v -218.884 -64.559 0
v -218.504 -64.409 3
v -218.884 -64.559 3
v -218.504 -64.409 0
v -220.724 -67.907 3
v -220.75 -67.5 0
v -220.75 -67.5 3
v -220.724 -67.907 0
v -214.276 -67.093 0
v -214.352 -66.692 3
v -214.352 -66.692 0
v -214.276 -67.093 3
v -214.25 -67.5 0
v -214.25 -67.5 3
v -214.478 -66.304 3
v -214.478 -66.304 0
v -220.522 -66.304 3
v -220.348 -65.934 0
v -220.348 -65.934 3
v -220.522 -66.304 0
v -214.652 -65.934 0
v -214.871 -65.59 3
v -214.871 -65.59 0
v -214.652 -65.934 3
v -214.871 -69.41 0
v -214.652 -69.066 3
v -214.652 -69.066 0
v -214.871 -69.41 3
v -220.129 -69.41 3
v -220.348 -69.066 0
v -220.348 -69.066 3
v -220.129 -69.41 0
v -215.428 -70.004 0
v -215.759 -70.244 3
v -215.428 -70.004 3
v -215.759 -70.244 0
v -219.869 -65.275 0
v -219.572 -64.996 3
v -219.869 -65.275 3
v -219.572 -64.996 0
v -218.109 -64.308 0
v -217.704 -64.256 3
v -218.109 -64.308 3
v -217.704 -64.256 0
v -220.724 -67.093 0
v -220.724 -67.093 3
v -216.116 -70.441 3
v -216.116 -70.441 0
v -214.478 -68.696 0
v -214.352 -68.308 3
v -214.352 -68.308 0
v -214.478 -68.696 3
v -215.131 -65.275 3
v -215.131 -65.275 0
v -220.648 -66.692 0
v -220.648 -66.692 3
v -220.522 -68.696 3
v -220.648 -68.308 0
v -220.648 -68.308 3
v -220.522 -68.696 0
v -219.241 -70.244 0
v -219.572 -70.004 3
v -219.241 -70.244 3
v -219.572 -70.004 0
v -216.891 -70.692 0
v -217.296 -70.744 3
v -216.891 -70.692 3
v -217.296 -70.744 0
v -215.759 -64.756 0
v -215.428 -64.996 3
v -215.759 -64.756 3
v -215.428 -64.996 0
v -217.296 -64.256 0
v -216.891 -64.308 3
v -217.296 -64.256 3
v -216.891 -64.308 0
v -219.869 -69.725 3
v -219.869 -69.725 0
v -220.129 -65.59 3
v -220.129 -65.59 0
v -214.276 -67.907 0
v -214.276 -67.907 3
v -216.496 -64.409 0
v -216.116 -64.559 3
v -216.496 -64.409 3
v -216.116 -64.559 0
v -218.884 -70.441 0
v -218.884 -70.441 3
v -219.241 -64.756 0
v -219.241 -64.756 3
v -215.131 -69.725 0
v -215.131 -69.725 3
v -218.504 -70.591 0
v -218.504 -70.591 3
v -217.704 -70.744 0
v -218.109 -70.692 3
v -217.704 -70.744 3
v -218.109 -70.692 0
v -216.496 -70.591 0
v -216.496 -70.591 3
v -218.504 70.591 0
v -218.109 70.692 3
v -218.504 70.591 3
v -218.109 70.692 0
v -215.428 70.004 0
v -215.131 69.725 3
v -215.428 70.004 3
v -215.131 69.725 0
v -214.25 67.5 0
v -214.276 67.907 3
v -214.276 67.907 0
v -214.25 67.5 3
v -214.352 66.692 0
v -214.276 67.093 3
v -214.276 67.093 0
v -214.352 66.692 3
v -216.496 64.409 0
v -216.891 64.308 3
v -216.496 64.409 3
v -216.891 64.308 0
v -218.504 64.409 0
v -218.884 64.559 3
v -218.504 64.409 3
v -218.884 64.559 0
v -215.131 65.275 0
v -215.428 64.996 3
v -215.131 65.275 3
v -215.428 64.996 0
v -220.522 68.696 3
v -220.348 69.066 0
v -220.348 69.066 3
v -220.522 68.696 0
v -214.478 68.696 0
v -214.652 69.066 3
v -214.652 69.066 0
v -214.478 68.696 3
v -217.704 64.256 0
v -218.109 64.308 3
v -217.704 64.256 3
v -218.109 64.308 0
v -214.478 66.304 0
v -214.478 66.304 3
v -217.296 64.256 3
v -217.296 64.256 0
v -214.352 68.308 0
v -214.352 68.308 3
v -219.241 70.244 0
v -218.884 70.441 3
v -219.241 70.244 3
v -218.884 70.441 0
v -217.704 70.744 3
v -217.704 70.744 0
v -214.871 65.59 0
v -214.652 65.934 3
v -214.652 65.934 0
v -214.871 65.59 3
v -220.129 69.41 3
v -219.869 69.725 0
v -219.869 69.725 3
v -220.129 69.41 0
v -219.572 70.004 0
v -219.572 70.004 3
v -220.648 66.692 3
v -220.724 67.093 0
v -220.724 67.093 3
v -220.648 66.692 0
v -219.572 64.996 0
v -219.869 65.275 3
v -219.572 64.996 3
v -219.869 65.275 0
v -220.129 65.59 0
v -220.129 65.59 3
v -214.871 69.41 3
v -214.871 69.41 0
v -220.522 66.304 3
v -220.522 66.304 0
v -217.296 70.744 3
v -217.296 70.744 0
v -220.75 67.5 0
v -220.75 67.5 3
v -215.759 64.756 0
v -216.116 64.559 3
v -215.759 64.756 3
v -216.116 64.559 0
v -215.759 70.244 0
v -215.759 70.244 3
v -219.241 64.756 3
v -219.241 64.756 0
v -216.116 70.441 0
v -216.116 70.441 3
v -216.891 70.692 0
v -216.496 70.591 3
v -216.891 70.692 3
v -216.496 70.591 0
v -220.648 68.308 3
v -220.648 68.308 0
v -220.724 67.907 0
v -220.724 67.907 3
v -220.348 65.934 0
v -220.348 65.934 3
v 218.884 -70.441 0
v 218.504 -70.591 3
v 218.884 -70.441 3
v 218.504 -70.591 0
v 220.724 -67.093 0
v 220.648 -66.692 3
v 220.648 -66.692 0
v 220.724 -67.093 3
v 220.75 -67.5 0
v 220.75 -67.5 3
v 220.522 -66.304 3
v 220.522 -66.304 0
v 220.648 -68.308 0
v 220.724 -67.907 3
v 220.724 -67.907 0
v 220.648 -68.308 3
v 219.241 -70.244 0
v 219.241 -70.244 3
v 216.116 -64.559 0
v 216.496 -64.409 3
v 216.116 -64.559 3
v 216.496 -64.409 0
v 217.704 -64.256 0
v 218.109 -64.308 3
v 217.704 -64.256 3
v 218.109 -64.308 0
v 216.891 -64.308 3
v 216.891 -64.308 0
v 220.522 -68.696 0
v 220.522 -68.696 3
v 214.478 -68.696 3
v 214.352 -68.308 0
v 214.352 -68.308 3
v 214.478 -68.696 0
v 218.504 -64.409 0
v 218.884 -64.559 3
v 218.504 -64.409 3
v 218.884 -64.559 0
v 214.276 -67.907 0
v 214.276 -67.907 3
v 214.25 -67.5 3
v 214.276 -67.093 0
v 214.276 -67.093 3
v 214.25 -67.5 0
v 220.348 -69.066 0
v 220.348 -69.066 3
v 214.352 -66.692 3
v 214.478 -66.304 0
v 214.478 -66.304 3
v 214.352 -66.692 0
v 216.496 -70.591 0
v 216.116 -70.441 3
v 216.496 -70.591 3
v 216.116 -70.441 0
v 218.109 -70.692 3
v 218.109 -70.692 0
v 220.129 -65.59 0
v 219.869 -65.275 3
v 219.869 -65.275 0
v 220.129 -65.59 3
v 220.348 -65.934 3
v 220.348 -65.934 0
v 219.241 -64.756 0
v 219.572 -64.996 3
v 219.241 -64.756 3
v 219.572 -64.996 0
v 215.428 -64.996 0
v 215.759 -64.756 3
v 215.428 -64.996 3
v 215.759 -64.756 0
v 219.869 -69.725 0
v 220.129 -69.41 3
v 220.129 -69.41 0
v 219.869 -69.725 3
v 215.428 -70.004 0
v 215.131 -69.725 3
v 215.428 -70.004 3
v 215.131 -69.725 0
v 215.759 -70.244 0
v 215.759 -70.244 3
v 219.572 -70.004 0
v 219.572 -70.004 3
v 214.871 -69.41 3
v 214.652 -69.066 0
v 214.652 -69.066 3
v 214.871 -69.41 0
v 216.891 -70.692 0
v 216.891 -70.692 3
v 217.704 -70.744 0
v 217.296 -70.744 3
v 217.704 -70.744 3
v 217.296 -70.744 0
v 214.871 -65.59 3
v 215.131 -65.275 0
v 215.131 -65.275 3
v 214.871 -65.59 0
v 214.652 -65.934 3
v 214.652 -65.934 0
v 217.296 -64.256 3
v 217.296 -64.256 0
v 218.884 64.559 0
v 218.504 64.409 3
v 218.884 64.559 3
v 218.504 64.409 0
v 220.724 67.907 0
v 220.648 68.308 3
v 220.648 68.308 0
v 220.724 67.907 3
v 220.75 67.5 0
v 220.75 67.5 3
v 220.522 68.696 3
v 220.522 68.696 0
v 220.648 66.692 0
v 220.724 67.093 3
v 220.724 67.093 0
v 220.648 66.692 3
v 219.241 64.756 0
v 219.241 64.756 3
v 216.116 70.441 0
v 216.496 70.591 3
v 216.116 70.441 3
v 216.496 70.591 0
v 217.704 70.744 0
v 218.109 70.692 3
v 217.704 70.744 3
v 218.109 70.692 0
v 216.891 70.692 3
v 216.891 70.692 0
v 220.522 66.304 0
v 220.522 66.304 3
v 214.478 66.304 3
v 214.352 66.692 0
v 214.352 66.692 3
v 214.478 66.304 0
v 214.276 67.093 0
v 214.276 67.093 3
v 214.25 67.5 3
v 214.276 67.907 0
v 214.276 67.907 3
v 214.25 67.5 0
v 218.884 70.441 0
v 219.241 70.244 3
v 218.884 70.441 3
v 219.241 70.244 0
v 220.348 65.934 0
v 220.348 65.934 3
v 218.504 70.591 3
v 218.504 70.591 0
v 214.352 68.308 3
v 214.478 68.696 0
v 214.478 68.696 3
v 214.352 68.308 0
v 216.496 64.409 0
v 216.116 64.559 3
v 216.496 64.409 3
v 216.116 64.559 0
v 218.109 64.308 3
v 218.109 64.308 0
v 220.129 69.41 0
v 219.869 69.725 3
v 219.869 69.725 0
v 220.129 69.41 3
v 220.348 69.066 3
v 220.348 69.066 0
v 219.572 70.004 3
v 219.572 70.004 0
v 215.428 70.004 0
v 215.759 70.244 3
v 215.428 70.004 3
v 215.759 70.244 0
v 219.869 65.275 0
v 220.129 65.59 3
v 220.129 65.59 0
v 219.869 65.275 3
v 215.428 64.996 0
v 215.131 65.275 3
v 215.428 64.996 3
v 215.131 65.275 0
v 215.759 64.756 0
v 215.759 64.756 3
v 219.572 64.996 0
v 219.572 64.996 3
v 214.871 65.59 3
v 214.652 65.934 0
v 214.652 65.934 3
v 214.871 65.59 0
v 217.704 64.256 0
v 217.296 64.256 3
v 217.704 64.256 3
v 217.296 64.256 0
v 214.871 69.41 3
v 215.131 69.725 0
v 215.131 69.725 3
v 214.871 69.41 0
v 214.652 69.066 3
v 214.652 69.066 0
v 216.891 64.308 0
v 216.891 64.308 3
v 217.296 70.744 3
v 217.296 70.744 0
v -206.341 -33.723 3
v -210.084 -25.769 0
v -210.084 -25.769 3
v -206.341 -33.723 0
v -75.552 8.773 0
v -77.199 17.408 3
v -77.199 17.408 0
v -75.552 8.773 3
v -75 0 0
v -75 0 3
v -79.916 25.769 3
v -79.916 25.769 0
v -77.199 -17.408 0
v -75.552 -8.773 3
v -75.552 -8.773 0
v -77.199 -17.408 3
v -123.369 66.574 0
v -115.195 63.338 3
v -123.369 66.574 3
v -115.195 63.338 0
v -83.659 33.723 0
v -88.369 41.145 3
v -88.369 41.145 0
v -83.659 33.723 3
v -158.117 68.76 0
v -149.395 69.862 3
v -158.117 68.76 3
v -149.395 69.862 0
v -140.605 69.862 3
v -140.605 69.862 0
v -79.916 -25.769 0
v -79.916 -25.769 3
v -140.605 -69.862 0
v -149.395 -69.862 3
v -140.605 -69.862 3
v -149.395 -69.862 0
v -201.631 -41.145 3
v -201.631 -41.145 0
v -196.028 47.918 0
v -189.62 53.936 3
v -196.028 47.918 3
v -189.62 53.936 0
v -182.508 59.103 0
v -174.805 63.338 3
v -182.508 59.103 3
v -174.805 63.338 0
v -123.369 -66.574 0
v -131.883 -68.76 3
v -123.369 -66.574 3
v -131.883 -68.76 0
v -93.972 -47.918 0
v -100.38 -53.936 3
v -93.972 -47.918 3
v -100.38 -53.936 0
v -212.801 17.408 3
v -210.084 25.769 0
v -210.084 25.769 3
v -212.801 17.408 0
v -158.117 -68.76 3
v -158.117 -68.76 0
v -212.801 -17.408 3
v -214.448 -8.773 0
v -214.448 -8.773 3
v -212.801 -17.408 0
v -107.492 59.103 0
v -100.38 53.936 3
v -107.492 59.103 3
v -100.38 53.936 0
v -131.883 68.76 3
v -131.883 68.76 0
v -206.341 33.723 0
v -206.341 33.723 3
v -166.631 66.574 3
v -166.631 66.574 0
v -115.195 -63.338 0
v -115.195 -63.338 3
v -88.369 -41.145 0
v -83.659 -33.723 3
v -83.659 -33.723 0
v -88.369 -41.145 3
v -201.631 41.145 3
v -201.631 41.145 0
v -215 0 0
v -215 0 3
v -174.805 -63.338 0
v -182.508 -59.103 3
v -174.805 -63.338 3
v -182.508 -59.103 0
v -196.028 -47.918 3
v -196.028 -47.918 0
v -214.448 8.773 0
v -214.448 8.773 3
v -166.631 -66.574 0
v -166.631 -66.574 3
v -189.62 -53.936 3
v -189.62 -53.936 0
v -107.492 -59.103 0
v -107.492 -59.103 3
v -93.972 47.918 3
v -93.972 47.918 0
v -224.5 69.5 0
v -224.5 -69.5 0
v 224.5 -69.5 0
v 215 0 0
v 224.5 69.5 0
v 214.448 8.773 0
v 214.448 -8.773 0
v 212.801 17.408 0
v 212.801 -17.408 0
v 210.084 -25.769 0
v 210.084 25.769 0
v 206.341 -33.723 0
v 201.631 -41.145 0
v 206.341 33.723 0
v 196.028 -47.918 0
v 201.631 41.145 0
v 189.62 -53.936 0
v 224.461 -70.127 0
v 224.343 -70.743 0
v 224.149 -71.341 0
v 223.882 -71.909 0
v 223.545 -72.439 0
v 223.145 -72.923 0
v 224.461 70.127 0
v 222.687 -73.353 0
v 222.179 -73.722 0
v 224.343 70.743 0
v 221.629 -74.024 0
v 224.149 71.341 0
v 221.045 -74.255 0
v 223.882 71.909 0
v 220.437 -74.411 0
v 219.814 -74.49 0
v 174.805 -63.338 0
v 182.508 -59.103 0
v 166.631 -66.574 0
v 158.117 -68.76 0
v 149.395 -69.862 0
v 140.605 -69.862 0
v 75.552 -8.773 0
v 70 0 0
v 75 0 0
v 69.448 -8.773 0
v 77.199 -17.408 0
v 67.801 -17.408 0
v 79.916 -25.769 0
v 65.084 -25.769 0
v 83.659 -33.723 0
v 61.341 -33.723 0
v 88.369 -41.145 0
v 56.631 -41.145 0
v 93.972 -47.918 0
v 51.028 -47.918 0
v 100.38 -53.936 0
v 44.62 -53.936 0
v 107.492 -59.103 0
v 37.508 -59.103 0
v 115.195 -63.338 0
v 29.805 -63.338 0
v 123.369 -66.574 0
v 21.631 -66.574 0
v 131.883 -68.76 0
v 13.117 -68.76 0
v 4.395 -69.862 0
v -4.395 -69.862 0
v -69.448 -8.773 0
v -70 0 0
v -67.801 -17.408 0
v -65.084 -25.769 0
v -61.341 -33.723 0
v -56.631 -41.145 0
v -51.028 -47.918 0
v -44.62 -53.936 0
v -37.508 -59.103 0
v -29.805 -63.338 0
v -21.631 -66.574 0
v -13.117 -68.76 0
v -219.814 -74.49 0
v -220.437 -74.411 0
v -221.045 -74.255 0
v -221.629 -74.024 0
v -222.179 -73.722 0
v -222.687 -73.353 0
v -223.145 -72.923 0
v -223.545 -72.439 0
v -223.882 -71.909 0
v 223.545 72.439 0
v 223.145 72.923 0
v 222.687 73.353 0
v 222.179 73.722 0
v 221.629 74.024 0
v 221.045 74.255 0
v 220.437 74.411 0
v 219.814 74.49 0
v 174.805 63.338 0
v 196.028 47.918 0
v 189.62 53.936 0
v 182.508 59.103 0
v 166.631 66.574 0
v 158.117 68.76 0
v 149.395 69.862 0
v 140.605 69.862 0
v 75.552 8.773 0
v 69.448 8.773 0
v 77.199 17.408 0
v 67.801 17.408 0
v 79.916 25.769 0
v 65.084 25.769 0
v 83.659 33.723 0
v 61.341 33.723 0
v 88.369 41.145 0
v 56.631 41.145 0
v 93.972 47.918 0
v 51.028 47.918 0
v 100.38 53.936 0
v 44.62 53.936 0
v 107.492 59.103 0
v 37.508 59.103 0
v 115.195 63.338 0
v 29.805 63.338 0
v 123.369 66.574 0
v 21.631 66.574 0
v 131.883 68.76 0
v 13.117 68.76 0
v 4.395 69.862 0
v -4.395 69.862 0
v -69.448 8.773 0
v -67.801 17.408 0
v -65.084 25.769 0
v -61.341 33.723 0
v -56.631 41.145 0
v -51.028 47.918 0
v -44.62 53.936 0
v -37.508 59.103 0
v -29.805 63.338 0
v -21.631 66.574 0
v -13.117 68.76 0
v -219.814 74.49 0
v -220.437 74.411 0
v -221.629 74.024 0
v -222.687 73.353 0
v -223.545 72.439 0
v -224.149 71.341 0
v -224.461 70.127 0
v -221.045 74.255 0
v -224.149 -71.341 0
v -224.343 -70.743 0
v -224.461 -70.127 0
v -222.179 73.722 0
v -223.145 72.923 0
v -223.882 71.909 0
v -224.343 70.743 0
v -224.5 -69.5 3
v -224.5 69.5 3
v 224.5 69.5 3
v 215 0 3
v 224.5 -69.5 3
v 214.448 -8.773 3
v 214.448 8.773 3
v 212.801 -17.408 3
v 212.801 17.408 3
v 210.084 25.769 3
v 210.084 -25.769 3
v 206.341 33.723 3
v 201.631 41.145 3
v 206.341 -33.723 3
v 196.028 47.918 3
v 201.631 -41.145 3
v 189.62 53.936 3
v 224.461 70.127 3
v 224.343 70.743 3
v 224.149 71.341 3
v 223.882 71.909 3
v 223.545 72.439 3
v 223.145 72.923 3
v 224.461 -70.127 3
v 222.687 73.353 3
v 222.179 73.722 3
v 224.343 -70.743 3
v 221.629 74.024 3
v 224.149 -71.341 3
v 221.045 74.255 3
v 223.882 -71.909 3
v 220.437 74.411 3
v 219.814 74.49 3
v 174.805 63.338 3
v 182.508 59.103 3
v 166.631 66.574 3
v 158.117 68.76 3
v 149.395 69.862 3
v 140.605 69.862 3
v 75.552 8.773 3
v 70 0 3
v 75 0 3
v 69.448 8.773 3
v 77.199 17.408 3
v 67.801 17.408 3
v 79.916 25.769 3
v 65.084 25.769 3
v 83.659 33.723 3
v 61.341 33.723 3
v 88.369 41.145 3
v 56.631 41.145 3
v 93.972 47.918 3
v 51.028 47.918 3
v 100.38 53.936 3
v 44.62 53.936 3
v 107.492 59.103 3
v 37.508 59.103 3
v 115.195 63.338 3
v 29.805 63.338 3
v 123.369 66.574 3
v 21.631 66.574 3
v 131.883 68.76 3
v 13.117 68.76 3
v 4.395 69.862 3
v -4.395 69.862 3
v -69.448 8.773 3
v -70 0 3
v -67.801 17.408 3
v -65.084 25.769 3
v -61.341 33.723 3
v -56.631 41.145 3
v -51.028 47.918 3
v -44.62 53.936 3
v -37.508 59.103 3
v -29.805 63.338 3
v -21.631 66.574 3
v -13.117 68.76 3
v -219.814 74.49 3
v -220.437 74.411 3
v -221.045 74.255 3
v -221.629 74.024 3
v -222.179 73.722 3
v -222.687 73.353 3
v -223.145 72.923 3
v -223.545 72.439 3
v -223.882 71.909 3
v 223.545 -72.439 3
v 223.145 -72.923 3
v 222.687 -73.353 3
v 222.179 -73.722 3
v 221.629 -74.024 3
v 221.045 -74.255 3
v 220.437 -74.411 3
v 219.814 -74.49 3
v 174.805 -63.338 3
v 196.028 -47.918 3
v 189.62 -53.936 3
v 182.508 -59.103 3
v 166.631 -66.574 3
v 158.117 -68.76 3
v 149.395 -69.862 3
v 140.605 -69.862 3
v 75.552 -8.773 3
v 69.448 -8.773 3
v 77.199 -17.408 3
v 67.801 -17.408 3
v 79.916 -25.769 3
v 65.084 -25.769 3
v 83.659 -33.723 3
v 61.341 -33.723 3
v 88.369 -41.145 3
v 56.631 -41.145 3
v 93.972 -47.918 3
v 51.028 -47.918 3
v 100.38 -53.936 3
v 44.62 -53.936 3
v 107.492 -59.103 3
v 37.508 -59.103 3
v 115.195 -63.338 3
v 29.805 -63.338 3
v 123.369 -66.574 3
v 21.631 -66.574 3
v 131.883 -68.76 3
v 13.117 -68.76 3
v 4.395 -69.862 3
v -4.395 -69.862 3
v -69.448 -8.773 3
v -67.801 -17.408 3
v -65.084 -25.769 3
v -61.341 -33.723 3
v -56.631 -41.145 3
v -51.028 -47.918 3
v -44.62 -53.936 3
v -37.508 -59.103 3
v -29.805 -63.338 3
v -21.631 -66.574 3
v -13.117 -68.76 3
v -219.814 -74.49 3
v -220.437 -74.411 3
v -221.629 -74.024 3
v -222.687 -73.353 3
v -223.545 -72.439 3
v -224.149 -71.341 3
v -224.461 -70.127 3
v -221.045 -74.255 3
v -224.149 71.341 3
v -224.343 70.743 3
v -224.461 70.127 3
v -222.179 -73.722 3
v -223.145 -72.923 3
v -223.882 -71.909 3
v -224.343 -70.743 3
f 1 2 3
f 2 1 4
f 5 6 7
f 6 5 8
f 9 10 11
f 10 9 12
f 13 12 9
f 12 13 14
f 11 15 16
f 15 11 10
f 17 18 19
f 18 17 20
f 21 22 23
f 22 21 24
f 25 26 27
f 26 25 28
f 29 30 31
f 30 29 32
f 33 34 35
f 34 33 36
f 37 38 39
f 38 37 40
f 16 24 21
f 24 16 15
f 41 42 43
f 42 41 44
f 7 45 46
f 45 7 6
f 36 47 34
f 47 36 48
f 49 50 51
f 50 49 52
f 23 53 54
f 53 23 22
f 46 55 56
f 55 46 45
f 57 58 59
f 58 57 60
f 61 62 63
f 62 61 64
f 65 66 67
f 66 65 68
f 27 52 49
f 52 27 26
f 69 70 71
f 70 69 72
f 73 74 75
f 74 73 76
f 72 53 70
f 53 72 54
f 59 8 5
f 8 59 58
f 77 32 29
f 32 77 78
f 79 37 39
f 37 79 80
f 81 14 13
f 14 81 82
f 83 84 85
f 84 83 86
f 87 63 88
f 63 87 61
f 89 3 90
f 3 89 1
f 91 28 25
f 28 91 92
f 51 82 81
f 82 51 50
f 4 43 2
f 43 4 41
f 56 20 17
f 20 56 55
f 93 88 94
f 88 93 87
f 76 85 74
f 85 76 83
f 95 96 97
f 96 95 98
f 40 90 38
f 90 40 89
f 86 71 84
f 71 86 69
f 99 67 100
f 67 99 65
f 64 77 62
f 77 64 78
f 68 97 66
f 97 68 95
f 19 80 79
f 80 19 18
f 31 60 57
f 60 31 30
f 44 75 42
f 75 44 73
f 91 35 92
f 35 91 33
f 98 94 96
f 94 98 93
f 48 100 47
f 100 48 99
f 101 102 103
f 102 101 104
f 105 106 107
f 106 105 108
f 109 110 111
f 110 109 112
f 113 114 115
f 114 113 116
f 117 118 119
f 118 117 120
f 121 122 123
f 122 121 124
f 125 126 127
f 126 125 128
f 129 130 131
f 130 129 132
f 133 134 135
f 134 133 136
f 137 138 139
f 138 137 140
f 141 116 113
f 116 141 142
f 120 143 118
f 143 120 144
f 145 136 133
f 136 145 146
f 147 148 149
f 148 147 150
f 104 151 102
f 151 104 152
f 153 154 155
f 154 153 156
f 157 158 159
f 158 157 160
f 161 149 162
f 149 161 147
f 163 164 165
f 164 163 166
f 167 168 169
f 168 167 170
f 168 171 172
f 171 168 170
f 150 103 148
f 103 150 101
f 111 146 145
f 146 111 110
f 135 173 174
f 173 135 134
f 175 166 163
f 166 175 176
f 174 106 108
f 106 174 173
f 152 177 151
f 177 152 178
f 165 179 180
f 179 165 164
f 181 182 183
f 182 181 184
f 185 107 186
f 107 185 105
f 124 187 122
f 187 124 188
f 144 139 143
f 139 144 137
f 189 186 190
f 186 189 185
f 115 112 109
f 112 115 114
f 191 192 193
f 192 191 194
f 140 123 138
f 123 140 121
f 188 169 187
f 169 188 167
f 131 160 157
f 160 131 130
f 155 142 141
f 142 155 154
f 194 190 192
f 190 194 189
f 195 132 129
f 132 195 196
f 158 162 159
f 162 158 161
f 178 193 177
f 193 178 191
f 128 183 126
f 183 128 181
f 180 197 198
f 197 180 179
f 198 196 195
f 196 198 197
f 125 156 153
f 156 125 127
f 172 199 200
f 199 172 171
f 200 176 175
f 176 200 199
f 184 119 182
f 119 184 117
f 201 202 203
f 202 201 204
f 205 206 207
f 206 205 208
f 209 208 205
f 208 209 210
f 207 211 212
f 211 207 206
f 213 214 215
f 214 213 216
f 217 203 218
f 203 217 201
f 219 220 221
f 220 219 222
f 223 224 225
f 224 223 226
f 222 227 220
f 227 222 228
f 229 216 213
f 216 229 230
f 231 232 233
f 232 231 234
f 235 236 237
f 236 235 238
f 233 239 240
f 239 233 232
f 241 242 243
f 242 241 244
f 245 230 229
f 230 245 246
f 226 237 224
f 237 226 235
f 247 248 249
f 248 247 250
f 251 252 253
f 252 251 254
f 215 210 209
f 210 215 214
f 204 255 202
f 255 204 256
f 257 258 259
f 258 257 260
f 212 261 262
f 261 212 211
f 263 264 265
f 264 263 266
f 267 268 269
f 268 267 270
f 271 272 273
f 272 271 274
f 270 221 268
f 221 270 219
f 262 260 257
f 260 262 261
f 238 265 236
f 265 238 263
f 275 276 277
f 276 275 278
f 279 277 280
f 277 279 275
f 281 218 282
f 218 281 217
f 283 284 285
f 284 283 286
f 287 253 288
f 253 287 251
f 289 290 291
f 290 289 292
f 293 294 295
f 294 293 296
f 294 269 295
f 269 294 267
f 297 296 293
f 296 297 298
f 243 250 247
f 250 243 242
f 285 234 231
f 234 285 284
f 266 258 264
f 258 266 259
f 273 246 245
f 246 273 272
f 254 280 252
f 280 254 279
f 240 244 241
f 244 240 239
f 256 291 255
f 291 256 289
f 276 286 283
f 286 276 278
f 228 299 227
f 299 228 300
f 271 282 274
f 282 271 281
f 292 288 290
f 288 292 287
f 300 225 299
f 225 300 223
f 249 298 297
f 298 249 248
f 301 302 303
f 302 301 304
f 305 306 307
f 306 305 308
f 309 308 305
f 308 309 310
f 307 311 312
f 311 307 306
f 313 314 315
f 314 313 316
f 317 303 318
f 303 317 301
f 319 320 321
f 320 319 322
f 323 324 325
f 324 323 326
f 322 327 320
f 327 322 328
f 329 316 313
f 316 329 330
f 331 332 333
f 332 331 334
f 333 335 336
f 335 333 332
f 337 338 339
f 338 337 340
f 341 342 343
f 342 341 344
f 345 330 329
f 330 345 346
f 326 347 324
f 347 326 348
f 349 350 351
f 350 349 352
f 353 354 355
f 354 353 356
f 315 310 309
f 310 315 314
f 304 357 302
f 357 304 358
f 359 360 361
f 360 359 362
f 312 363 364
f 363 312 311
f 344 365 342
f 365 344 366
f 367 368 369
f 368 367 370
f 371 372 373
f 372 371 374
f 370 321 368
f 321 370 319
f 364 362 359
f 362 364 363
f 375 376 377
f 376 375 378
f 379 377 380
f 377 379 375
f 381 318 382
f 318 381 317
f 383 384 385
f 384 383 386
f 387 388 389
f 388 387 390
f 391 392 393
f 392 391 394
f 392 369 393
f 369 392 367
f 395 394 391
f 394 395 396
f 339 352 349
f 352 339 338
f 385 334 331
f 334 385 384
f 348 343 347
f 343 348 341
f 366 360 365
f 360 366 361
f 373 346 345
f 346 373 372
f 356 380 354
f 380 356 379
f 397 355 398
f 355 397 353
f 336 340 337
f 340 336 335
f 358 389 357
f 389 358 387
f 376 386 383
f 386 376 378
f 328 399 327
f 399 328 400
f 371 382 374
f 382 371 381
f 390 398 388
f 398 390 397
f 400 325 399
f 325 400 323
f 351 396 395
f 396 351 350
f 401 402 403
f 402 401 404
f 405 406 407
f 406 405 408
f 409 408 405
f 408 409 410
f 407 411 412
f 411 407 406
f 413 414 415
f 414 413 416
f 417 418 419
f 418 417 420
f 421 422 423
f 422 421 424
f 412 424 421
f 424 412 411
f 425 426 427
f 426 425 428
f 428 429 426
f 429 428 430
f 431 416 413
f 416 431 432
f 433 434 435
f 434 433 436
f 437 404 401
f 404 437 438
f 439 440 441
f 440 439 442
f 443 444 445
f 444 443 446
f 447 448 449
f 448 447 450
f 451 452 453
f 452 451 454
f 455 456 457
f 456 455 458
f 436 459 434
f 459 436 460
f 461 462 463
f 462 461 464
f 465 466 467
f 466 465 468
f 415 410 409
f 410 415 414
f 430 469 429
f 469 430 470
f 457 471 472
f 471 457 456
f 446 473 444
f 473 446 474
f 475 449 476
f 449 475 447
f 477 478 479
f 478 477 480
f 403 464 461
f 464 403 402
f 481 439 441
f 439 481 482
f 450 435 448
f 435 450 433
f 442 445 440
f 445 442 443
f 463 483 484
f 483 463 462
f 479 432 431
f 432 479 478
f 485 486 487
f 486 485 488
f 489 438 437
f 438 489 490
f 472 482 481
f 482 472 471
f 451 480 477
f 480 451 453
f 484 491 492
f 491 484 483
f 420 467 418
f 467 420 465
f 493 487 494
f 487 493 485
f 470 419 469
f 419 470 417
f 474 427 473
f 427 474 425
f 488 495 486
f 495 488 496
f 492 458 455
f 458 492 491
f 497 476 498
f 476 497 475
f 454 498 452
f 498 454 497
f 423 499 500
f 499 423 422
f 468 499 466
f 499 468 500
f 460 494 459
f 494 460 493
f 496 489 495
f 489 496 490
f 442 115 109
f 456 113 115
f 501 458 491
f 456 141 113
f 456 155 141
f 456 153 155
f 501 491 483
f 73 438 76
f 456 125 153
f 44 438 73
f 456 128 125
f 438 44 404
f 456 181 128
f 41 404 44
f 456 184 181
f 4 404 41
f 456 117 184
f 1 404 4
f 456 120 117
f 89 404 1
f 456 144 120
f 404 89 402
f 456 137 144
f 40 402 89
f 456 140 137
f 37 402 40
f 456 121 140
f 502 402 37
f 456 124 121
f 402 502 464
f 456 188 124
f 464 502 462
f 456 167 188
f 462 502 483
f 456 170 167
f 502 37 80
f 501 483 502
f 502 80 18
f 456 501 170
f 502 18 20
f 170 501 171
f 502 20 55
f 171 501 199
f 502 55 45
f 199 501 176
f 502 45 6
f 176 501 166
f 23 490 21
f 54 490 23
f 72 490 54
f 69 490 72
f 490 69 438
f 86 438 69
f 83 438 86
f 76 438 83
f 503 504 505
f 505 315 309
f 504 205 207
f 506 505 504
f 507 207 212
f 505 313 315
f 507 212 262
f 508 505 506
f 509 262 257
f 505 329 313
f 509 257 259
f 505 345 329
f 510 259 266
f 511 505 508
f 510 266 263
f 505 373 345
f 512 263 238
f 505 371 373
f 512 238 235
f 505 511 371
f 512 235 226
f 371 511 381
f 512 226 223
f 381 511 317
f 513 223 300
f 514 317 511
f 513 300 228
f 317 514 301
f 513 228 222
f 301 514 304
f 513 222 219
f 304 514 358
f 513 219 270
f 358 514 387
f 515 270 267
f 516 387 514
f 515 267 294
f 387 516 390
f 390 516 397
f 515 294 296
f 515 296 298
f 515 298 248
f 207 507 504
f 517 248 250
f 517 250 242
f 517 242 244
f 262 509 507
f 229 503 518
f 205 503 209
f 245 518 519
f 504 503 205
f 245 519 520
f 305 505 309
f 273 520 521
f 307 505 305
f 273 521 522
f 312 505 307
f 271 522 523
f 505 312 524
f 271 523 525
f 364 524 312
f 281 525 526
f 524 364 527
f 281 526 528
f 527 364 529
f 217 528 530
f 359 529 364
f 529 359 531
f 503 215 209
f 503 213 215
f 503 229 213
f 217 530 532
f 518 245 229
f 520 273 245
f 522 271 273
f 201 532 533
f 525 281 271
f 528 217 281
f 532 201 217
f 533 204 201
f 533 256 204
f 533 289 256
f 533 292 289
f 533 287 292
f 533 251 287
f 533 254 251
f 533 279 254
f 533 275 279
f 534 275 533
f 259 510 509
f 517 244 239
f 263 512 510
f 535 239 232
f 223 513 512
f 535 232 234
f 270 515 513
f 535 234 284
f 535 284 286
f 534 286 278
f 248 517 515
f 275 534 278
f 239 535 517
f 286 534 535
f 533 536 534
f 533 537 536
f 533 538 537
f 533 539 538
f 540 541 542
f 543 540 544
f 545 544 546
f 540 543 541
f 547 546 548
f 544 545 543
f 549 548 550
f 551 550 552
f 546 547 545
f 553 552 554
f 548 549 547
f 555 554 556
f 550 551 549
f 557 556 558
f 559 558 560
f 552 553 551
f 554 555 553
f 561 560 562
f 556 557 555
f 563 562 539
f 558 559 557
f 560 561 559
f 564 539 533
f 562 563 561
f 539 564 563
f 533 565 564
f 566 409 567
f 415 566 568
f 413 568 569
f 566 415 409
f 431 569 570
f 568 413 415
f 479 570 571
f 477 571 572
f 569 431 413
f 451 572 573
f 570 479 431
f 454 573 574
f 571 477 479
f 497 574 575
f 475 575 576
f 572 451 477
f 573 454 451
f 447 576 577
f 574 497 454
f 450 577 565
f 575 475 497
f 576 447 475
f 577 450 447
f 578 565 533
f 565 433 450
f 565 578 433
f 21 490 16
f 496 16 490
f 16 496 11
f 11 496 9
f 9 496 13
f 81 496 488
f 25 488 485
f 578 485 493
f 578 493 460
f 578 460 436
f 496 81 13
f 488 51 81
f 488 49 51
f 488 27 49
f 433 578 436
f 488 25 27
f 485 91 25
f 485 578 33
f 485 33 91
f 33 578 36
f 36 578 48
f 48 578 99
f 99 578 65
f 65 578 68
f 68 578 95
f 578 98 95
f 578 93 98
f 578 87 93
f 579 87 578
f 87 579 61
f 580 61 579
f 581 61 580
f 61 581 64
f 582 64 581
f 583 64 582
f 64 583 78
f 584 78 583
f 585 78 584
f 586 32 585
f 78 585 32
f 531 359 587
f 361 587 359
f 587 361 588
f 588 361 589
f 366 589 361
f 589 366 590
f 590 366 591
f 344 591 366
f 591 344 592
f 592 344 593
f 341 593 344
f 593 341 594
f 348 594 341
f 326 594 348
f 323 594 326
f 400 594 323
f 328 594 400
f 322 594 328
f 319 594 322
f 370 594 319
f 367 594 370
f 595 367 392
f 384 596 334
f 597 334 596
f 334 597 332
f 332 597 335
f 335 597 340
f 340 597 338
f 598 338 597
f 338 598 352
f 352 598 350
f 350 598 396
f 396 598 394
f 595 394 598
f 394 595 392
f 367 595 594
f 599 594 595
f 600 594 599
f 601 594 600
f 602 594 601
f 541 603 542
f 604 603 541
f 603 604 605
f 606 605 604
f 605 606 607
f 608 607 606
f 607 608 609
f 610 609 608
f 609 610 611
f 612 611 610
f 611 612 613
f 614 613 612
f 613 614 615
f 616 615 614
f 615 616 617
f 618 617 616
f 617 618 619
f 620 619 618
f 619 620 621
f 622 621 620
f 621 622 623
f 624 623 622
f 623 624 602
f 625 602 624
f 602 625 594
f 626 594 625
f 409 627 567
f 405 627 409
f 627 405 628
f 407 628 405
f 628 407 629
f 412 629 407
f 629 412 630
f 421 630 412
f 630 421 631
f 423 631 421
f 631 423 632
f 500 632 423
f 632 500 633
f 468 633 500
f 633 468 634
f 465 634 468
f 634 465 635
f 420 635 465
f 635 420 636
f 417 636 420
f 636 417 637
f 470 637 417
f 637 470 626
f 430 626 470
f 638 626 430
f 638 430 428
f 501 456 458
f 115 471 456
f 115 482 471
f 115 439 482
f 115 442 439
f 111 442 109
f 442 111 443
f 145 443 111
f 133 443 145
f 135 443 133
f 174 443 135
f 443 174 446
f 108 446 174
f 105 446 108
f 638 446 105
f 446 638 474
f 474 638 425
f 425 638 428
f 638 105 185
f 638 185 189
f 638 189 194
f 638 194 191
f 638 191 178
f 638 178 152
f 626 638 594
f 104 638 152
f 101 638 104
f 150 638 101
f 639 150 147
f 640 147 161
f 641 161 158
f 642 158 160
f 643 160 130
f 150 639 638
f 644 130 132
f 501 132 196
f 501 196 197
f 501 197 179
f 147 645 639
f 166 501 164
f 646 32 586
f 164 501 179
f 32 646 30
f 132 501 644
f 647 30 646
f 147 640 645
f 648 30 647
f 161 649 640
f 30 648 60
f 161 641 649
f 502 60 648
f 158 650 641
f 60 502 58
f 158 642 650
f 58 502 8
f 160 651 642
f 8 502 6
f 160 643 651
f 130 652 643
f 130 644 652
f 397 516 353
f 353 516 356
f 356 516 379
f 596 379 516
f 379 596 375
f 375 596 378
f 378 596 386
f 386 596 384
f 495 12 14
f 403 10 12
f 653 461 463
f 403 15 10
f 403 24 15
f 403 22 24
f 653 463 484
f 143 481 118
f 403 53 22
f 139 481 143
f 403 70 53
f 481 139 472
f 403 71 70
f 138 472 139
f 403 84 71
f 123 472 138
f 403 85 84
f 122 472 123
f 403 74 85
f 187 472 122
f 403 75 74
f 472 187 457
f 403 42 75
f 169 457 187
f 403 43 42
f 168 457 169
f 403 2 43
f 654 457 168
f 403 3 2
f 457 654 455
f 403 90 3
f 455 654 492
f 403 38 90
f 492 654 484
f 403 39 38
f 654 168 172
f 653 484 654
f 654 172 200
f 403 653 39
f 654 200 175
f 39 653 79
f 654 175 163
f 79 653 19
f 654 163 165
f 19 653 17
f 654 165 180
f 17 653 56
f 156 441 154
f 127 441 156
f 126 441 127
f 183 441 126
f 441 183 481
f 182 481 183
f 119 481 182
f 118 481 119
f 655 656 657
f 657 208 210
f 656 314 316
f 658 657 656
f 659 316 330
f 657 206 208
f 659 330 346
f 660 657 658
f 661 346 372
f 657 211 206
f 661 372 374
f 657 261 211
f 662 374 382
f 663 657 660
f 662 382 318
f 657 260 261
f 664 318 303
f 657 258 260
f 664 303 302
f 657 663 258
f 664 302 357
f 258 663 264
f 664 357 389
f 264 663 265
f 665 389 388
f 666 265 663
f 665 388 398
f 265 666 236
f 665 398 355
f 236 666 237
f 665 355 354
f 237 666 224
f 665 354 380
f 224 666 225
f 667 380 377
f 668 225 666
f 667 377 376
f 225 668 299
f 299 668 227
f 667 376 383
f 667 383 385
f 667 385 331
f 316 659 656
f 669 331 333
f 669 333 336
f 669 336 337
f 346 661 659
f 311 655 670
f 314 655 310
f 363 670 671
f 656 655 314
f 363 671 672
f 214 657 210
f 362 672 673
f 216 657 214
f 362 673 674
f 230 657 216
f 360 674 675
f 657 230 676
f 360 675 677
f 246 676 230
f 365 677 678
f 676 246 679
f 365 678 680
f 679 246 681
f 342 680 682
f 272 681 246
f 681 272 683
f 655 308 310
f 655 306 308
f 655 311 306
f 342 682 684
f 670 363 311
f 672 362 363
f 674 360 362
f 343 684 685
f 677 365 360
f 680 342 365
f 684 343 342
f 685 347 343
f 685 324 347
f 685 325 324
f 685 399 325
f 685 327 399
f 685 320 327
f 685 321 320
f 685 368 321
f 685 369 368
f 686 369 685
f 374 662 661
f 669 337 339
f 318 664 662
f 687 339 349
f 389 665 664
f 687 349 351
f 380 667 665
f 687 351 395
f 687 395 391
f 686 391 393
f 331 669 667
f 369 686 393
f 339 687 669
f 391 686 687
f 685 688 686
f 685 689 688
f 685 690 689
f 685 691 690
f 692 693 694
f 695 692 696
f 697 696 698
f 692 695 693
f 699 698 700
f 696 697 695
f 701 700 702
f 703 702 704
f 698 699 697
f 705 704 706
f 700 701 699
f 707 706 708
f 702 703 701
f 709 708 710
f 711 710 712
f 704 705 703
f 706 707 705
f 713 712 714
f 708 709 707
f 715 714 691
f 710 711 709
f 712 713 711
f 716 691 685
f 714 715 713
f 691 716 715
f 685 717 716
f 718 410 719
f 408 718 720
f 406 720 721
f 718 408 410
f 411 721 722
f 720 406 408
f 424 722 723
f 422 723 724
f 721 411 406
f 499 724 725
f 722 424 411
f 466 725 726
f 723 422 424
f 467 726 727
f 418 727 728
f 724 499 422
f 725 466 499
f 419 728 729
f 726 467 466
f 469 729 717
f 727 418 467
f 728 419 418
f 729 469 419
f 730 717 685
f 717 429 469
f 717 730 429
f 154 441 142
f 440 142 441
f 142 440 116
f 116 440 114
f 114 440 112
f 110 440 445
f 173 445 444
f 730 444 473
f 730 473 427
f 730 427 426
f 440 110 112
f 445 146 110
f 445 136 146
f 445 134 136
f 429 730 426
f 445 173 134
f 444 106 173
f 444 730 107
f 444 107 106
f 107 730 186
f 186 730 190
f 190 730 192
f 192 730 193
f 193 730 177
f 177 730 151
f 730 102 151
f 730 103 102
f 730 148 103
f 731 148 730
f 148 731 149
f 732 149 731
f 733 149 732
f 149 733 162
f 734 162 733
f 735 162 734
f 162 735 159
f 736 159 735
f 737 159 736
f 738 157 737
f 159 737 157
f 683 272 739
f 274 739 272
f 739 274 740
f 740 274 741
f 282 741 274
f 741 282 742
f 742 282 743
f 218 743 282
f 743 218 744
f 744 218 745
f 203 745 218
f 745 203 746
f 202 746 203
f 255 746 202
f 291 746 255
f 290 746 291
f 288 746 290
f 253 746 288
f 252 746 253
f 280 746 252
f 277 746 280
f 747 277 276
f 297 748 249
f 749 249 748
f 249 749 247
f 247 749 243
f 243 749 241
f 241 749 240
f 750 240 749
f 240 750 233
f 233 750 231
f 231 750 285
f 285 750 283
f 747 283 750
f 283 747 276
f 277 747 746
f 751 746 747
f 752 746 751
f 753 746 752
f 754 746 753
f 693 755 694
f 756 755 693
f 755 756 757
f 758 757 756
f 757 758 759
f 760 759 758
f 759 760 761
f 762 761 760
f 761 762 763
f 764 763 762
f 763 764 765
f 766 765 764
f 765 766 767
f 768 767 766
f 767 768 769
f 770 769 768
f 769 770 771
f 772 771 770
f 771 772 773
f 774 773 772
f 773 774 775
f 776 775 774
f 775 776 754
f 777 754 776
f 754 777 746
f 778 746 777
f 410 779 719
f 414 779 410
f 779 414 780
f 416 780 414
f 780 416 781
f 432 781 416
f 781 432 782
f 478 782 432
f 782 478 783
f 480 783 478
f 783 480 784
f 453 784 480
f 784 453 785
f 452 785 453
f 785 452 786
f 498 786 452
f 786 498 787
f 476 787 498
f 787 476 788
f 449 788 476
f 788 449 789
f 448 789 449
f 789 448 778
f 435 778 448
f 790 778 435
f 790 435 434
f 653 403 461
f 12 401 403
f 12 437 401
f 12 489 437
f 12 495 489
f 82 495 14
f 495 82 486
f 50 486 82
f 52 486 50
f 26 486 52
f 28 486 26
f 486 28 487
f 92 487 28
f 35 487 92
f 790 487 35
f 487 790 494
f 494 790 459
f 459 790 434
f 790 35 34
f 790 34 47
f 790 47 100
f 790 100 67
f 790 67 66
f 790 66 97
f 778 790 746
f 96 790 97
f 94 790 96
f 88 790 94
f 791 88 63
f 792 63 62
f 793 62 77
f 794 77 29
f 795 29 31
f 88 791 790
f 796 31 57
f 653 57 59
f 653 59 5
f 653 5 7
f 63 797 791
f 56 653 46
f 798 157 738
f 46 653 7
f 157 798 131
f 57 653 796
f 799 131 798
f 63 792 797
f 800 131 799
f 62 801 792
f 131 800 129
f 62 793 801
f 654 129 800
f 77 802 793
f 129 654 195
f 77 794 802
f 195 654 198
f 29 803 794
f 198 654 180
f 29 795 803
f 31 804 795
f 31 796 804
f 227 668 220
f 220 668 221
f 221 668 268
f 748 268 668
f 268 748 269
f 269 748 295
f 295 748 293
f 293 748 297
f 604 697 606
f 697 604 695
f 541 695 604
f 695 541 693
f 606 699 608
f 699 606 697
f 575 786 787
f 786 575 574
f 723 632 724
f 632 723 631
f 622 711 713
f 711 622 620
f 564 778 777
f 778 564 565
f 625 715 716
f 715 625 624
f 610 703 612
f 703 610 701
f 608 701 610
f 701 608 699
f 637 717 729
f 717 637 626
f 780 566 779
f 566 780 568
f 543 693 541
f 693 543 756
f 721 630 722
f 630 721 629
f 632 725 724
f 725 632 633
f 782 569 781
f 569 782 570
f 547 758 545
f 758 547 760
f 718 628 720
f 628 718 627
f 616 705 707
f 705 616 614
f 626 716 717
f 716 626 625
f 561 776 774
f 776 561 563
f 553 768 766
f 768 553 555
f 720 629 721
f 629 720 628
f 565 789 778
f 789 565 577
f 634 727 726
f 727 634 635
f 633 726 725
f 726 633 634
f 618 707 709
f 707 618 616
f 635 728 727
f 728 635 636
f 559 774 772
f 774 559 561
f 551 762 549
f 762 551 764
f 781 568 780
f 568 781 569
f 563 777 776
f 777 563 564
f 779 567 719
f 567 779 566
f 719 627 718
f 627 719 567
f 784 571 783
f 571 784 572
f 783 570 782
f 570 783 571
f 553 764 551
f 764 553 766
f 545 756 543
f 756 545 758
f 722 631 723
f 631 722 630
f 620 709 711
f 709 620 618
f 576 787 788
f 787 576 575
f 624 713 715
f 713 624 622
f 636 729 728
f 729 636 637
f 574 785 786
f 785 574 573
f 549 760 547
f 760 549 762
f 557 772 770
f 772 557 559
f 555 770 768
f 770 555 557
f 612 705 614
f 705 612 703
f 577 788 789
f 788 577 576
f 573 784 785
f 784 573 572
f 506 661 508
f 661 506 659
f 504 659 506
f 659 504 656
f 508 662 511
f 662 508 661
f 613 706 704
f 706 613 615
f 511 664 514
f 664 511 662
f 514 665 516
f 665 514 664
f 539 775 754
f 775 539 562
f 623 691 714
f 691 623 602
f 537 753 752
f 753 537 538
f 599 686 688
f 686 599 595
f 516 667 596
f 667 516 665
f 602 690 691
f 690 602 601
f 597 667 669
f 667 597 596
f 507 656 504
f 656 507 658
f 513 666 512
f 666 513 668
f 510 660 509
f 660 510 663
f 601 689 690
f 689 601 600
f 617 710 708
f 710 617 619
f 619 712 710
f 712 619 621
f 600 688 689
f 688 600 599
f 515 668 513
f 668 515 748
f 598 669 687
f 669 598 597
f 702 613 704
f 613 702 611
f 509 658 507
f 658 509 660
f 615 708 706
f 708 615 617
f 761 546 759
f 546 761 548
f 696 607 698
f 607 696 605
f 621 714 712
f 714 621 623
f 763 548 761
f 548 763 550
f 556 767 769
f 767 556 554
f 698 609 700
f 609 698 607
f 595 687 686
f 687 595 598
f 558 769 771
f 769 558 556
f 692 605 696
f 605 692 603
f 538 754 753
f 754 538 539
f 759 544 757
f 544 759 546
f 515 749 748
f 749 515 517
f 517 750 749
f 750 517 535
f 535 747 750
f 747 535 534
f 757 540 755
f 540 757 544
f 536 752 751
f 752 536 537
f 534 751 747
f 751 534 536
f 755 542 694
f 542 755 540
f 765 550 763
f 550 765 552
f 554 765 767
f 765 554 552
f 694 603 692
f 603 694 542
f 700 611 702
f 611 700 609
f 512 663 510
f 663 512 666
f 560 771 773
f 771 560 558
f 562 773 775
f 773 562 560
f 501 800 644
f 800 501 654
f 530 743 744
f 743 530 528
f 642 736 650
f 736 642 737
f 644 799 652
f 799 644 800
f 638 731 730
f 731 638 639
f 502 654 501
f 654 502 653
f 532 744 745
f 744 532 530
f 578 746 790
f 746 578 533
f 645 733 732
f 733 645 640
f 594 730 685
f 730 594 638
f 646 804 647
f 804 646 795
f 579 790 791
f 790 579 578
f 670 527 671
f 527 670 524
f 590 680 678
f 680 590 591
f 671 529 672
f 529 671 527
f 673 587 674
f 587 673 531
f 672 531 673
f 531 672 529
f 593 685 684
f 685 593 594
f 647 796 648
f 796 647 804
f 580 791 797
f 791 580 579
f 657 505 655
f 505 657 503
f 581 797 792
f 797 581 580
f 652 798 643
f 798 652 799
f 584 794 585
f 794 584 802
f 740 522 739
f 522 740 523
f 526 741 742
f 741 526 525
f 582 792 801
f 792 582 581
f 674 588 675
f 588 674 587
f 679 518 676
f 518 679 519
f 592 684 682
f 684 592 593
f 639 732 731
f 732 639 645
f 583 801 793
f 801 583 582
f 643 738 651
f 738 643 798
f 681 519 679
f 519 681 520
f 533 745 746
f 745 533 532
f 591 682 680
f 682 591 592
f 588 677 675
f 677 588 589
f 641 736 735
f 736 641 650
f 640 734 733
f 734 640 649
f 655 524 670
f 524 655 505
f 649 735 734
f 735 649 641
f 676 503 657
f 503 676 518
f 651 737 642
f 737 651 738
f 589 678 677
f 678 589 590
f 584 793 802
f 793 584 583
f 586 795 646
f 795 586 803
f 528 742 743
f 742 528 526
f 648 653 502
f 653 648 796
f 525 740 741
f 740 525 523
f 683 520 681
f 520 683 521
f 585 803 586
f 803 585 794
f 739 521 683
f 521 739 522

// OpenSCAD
$fn = 50;


difference() {
	union() {
		hull() {
			translate(v = [-219.5000000000, 69.5000000000, 0]) {
				cylinder(h = 3, r = 5);
			}
			translate(v = [219.5000000000, 69.5000000000, 0]) {
				cylinder(h = 3, r = 5);
			}
			translate(v = [-219.5000000000, -69.5000000000, 0]) {
				cylinder(h = 3, r = 5);
			}
			translate(v = [219.5000000000, -69.5000000000, 0]) {
				cylinder(h = 3, r = 5);
			}
		}
	}
	union() {
		#translate(v = [-217.5000000000, -67.5000000000, -100.0000000000]) {
			cylinder(h = 200, r = 3.2500000000);
		}
		#translate(v = [-217.5000000000, 67.5000000000, -100.0000000000]) {
			cylinder(h = 200, r = 3.2500000000);
		}
		#translate(v = [217.5000000000, -67.5000000000, -100.0000000000]) {
			cylinder(h = 200, r = 3.2500000000);
		}
		#translate(v = [217.5000000000, 67.5000000000, -100.0000000000]) {
			cylinder(h = 200, r = 3.2500000000);
		}
		#translate(v = [-145.0000000000, 0, 0]) {
			cylinder(h = 3, r = 70.0000000000);
		}
		#cylinder(h = 3, r = 70.0000000000);
		#translate(v = [145.0000000000, 0, 0]) {
			cylinder(h = 3, r = 70.0000000000);
		}
	}
}
